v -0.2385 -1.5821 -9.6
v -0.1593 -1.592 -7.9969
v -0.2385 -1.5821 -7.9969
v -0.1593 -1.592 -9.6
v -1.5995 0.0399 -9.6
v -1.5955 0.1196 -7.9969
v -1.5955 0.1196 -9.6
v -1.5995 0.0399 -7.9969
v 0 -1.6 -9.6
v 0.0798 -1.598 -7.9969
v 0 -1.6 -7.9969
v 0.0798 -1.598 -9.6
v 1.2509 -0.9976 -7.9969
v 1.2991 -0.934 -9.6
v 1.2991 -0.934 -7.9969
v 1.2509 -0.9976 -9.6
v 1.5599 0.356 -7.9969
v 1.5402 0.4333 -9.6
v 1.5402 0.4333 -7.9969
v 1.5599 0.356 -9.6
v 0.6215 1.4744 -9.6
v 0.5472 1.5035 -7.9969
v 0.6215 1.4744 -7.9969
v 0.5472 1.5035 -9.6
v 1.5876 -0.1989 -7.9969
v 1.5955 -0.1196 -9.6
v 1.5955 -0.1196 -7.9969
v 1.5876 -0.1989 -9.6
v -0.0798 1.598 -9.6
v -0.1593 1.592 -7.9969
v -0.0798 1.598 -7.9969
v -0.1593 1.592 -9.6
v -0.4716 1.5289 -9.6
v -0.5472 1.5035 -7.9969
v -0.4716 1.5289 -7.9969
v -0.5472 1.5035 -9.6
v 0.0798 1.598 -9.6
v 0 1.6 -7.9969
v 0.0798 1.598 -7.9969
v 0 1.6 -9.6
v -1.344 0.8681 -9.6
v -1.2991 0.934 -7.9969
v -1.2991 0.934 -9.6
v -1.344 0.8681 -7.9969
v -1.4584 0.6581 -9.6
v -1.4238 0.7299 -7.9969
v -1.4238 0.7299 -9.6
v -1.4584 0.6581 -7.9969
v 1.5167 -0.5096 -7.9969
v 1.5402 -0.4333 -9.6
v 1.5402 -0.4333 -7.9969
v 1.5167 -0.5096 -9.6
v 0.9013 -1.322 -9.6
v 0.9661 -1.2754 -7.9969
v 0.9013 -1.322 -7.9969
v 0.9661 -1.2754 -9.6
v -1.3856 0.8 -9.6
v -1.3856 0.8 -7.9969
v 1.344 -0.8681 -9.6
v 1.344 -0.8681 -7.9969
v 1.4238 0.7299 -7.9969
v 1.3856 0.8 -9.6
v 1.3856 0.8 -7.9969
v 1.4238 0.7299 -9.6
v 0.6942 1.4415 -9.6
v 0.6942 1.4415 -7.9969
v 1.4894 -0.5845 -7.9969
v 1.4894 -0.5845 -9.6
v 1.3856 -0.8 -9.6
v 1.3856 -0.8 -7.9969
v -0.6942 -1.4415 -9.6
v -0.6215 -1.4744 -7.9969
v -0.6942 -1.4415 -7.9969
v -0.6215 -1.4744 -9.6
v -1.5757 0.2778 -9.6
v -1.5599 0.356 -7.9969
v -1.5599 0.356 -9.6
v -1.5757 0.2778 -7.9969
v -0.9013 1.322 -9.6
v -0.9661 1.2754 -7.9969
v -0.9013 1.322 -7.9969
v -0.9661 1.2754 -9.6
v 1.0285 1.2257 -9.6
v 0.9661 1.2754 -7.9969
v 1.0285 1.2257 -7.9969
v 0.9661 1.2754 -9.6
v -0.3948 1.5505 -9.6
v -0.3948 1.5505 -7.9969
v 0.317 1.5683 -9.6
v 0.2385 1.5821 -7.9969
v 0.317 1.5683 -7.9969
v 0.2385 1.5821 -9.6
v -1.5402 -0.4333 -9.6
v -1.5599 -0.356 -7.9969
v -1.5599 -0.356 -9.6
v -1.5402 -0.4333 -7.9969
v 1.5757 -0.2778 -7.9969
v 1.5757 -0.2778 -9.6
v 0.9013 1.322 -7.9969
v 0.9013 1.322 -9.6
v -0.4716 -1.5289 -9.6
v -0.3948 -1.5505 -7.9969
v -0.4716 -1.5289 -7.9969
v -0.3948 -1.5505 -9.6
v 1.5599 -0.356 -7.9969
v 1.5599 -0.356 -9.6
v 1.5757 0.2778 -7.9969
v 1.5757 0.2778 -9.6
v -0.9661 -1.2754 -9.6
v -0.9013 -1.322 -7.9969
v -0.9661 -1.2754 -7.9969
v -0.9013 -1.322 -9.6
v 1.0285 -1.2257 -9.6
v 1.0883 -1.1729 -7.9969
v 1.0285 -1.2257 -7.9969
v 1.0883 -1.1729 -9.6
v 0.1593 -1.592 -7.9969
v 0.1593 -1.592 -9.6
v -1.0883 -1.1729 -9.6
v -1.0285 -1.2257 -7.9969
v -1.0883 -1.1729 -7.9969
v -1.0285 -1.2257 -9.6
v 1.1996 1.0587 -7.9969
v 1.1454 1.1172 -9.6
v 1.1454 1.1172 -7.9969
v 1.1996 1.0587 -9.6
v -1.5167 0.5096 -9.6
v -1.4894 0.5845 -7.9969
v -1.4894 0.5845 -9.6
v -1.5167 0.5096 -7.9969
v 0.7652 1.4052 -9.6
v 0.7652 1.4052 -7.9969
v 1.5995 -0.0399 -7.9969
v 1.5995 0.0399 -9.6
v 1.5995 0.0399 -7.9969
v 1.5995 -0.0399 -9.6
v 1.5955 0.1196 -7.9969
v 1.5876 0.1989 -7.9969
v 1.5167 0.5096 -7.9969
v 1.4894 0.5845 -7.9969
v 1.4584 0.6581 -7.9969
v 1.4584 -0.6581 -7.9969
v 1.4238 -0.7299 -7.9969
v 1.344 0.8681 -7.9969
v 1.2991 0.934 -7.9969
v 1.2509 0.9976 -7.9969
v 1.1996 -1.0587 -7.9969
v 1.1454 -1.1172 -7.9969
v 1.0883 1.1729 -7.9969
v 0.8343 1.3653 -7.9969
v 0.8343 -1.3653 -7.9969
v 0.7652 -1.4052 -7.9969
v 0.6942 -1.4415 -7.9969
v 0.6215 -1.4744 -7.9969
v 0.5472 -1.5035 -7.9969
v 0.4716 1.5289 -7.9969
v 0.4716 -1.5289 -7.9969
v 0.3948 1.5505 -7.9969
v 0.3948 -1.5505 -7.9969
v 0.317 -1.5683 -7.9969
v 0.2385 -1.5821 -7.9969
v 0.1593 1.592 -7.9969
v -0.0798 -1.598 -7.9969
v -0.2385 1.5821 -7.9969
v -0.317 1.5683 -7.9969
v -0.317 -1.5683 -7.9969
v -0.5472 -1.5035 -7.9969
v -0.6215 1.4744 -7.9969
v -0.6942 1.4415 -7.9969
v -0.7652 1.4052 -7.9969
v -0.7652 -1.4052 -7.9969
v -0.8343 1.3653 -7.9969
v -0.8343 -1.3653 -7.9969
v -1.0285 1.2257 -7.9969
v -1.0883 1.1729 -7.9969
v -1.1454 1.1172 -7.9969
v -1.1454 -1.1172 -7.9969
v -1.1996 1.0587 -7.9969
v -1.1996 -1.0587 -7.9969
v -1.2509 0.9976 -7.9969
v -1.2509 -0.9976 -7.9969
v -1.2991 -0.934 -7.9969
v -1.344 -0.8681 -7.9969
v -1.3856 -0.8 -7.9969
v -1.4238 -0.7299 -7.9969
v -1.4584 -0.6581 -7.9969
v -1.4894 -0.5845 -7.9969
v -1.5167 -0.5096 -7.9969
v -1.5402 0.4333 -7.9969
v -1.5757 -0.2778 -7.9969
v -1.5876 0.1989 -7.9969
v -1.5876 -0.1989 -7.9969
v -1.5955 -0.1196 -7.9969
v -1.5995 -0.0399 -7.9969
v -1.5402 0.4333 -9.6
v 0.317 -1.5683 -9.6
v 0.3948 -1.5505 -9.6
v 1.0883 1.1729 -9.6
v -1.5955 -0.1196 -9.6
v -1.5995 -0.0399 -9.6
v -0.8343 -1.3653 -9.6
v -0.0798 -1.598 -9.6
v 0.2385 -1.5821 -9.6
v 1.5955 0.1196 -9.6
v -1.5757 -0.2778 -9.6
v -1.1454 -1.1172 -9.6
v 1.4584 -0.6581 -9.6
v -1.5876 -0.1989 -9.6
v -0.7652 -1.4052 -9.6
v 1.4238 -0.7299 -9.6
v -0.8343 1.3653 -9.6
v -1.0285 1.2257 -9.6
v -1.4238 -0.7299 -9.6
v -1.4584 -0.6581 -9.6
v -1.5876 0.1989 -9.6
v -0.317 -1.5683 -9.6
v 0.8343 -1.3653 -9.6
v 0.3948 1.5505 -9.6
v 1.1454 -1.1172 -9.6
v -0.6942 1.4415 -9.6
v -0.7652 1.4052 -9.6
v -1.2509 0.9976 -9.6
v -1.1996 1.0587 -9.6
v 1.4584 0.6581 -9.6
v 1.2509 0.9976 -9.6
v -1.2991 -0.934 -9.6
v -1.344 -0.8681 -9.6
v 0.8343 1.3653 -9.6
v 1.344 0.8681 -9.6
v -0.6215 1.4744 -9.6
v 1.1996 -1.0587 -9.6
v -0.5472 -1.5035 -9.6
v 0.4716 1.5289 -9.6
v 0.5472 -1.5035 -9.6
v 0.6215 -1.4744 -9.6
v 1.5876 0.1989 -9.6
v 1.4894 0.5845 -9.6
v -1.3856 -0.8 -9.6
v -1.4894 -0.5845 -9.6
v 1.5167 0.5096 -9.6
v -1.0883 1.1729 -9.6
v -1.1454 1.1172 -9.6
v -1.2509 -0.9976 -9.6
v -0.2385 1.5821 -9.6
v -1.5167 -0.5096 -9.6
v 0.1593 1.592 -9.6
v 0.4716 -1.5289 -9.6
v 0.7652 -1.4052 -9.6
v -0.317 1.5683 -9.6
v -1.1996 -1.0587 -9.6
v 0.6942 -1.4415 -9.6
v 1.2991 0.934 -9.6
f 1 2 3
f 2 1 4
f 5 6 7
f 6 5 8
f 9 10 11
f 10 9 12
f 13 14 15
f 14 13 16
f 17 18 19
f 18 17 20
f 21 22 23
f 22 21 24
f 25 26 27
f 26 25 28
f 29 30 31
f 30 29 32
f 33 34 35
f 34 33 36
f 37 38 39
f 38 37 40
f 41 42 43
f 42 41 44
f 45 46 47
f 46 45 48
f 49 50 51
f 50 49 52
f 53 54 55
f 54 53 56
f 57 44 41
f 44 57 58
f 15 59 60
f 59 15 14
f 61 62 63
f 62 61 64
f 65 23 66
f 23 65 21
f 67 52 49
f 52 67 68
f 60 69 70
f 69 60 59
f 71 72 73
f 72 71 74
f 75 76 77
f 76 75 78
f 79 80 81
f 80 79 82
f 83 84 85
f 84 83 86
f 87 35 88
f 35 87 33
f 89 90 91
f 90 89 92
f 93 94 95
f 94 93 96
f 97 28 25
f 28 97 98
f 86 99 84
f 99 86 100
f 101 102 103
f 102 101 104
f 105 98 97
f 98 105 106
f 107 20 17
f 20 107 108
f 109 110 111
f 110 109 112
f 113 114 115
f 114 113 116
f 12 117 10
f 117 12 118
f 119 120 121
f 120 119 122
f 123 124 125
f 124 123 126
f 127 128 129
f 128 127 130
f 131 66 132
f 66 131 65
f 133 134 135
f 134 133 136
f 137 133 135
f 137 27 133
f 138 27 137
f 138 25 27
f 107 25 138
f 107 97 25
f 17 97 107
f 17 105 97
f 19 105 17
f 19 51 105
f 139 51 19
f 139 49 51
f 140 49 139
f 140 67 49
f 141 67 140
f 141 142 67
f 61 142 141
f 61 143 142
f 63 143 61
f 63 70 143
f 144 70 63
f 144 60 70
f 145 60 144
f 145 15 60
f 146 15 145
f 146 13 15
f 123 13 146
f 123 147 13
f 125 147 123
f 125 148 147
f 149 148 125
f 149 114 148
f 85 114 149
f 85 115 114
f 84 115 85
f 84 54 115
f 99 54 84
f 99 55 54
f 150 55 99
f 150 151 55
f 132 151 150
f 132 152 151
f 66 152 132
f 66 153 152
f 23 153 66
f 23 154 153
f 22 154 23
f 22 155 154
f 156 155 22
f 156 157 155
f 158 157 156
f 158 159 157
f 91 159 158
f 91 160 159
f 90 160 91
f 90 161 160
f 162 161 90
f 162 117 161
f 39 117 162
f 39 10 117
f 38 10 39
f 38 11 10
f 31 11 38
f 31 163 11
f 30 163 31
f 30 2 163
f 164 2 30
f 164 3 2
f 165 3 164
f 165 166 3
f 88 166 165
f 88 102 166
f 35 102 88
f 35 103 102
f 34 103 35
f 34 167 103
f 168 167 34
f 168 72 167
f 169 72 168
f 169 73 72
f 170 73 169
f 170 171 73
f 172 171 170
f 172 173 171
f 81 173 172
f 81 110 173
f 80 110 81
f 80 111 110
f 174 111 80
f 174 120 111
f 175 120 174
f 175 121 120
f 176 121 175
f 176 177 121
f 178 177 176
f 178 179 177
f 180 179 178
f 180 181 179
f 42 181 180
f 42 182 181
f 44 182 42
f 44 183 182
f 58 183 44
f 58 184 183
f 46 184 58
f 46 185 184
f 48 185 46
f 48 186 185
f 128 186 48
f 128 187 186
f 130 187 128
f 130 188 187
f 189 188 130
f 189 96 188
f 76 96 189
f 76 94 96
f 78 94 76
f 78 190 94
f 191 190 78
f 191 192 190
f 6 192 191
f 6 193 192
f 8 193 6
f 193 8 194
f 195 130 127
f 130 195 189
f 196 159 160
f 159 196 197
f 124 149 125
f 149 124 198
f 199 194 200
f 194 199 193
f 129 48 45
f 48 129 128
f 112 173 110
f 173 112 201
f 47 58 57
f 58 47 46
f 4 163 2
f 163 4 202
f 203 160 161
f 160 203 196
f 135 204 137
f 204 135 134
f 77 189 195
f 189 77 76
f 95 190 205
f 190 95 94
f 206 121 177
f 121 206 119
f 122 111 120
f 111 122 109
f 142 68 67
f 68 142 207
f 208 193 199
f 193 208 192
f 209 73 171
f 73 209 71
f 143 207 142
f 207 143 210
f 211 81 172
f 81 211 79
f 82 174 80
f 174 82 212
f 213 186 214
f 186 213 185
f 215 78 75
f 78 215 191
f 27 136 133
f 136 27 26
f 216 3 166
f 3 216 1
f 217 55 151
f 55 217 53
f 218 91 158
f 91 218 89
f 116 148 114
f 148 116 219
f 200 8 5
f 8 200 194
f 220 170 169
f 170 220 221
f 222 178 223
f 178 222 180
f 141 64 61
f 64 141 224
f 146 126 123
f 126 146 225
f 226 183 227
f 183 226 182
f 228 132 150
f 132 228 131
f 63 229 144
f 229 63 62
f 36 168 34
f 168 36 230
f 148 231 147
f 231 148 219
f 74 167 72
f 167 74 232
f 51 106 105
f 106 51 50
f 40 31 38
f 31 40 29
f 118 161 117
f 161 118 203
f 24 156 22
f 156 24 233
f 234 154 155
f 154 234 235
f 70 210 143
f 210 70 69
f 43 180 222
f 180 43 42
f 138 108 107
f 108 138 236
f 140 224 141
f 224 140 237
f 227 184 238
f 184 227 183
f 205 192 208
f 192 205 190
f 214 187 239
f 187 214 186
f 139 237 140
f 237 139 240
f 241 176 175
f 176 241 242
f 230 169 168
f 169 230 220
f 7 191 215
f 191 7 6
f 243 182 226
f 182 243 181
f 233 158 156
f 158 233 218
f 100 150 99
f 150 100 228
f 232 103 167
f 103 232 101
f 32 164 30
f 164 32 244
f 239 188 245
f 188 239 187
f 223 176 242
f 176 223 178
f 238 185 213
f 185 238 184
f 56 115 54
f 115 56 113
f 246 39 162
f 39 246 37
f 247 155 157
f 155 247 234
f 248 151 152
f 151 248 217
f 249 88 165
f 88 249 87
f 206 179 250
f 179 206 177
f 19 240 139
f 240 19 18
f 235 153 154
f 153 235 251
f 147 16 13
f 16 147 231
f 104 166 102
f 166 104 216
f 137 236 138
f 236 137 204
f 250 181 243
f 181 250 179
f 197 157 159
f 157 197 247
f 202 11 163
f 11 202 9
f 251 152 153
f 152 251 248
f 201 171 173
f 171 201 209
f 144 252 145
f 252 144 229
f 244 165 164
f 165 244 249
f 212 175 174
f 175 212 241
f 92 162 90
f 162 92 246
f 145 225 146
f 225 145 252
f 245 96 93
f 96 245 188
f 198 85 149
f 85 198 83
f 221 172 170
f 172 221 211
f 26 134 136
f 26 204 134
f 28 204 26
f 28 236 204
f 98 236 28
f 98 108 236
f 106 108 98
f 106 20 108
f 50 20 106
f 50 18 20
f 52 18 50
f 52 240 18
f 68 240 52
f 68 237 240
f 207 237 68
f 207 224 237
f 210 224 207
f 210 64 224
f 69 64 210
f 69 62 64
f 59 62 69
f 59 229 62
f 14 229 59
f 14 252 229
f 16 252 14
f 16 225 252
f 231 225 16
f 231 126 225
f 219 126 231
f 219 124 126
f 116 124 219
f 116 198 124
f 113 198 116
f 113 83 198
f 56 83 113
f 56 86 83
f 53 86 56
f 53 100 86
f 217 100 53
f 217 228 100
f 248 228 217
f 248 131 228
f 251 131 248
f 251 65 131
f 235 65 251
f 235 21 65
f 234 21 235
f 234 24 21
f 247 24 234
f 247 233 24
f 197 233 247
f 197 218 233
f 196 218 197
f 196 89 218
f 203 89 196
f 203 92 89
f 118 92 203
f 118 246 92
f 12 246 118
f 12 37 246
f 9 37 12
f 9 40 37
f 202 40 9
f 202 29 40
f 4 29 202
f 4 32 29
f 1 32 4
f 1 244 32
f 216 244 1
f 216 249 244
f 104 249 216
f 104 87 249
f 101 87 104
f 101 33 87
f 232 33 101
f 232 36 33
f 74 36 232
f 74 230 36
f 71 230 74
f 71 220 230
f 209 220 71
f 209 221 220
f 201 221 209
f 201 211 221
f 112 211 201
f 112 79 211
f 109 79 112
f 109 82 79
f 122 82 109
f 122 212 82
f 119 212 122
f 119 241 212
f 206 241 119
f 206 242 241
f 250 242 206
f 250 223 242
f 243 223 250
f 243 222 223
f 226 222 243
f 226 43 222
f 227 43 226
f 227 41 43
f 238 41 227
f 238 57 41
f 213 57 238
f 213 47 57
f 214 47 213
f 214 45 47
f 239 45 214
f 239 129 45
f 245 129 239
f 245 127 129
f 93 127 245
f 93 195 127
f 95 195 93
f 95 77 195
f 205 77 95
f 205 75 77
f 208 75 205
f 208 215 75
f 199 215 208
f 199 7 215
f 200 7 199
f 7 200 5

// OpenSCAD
// file: ../p/4-4edge.scad
use <../lib.scad>
$fa=1; $fs=0.2;
function ldraw_lib__4_4edge(realsolid=false) = [
// 0 Circle 1.0
// 0 Name: 4-4edge.dat
// 0 Author: James Jessiman
// 0 !LDRAW_ORG Primitive UPDATE 2017-01
// 0 !LICENSE Licensed under CC BY 2.0 and CC BY 4.0 : see CAreadme.txt
// 
// 0 BFC CERTIFY CCW
  [0,"BFC","CERTIFY"],
  [0,"BFC","CCW"],
// 
// 0 !HISTORY 1998-12-15 [PTadmin] Official Update 1998-10
// 0 !HISTORY 2005-12-28 [PTadmin] Official Update 2005-01
// 0 !HISTORY 2007-06-24 [PTadmin] Header formatted for Contributor Agreement
// 0 !HISTORY 2008-07-01 [PTadmin] Official Update 2008-01
// 0 !HISTORY 2017-01-15 [Steffen] BFCed
// 0 !HISTORY 2017-12-30 [PTadmin] Official Update 2017-01
// 
// 
// 2 24 1 0 0 0.9239 0 0.3827
  [2,24,1,0,0,0.9239,0,0.3827],
// 2 24 0.9239 0 0.3827 0.7071 0 0.7071
  [2,24,0.9239,0,0.3827,0.7071,0,0.7071],
// 2 24 0.7071 0 0.7071 0.3827 0 0.9239
  [2,24,0.7071,0,0.7071,0.3827,0,0.9239],
// 2 24 0.3827 0 0.9239 0 0 1
  [2,24,0.3827,0,0.9239,0,0,1],
// 2 24 0 0 1 -0.3827 0 0.9239
  [2,24,0,0,1,-0.3827,0,0.9239],
// 2 24 -0.3827 0 0.9239 -0.7071 0 0.7071
  [2,24,-0.3827,0,0.9239,-0.7071,0,0.7071],
// 2 24 -0.7071 0 0.7071 -0.9239 0 0.3827
  [2,24,-0.7071,0,0.7071,-0.9239,0,0.3827],
// 2 24 -0.9239 0 0.3827 -1 0 -0
  [2,24,-0.9239,0,0.3827,-1,0,-0],
// 2 24 -1 0 -0 -0.9239 0 -0.3827
  [2,24,-1,0,-0,-0.9239,0,-0.3827],
// 2 24 -0.9239 0 -0.3827 -0.7071 0 -0.7071
  [2,24,-0.9239,0,-0.3827,-0.7071,0,-0.7071],
// 2 24 -0.7071 0 -0.7071 -0.3827 0 -0.9239
  [2,24,-0.7071,0,-0.7071,-0.3827,0,-0.9239],
// 2 24 -0.3827 0 -0.9239 0 0 -1
  [2,24,-0.3827,0,-0.9239,0,0,-1],
// 2 24 0 0 -1 0.3827 0 -0.9239
  [2,24,0,0,-1,0.3827,0,-0.9239],
// 2 24 0.3827 0 -0.9239 0.7071 0 -0.7071
  [2,24,0.3827,0,-0.9239,0.7071,0,-0.7071],
// 2 24 0.7071 0 -0.7071 0.9239 0 -0.3827
  [2,24,0.7071,0,-0.7071,0.9239,0,-0.3827],
// 2 24 0.9239 0 -0.3827 1 0 0
  [2,24,0.9239,0,-0.3827,1,0,0],
];
module ldraw_lib__4_4edge(step=0, col=false, unit=2/5, alt=false, line=0.2, solid=!$preview)
    makepoly(ldraw_lib__4_4edge(solid), step=step, col=col, unit=unit, alt=alt, line=line, solid=solid);
ldraw_lib__4_4edge(line=0.2);
// file: ../p/4-4disc.scad
use <../lib.scad>
$fa=1; $fs=0.2;
function ldraw_lib__4_4disc(realsolid=false) = [
// 0 Disc 1.0
// 0 Name: 4-4disc.dat
// 0 Author: James Jessiman
// 0 !LDRAW_ORG Primitive UPDATE 2002-02
// 0 !LICENSE Licensed under CC BY 2.0 and CC BY 4.0 : see CAreadme.txt
// 
// 0 BFC CERTIFY CCW
  [0,"BFC","CERTIFY"],
  [0,"BFC","CCW"],
// 
// 0 !HISTORY 1998-12-15 [PTadmin] Official Update 1998-10
// 0 !HISTORY 2002-03-23 [sbliss] Added BFC statement
// 0 !HISTORY 2002-04-25 [PTadmin] Official Update 2002-02
// 0 !HISTORY 2007-06-24 [PTadmin] Header formatted for Contributor Agreement
// 0 !HISTORY 2008-07-01 [PTadmin] Official Update 2008-01
// 
// 
// 3 16 0 0 0 1 0 0 0.9239 0 0.3827
  [3,16,0,0,0,1,0,0,0.9239,0,0.3827],
// 3 16 0 0 0 0.9239 0 0.3827 0.7071 0 0.7071
  [3,16,0,0,0,0.9239,0,0.3827,0.7071,0,0.7071],
// 3 16 0 0 0 0.7071 0 0.7071 0.3827 0 0.9239
  [3,16,0,0,0,0.7071,0,0.7071,0.3827,0,0.9239],
// 3 16 0 0 0 0.3827 0 0.9239 0 0 1
  [3,16,0,0,0,0.3827,0,0.9239,0,0,1],
// 3 16 0 0 0 0 0 1 -0.3827 0 0.9239
  [3,16,0,0,0,0,0,1,-0.3827,0,0.9239],
// 3 16 0 0 0 -0.3827 0 0.9239 -0.7071 0 0.7071
  [3,16,0,0,0,-0.3827,0,0.9239,-0.7071,0,0.7071],
// 3 16 0 0 0 -0.7071 0 0.7071 -0.9239 0 0.3827
  [3,16,0,0,0,-0.7071,0,0.7071,-0.9239,0,0.3827],
// 3 16 0 0 0 -0.9239 0 0.3827 -1 0 -0
  [3,16,0,0,0,-0.9239,0,0.3827,-1,0,-0],
// 3 16 0 0 0 -1 0 -0 -0.9239 0 -0.3827
  [3,16,0,0,0,-1,0,-0,-0.9239,0,-0.3827],
// 3 16 0 0 0 -0.9239 0 -0.3827 -0.7071 0 -0.7071
  [3,16,0,0,0,-0.9239,0,-0.3827,-0.7071,0,-0.7071],
// 3 16 0 0 0 -0.7071 0 -0.7071 -0.3827 0 -0.9239
  [3,16,0,0,0,-0.7071,0,-0.7071,-0.3827,0,-0.9239],
// 3 16 0 0 0 -0.3827 0 -0.9239 0 0 -1
  [3,16,0,0,0,-0.3827,0,-0.9239,0,0,-1],
// 3 16 0 0 0 0 0 -1 0.3827 0 -0.9239
  [3,16,0,0,0,0,0,-1,0.3827,0,-0.9239],
// 3 16 0 0 0 0.3827 0 -0.9239 0.7071 0 -0.7071
  [3,16,0,0,0,0.3827,0,-0.9239,0.7071,0,-0.7071],
// 3 16 0 0 0 0.7071 0 -0.7071 0.9239 0 -0.3827
  [3,16,0,0,0,0.7071,0,-0.7071,0.9239,0,-0.3827],
// 3 16 0 0 0 0.9239 0 -0.3827 1 0 0
  [3,16,0,0,0,0.9239,0,-0.3827,1,0,0],
// 0
];
module ldraw_lib__4_4disc(step=0, col=false, unit=2/5, alt=false, line=0.2, solid=!$preview)
    makepoly(ldraw_lib__4_4disc(solid), step=step, col=col, unit=unit, alt=alt, line=line, solid=solid);
ldraw_lib__4_4disc(line=0.2);
// file: ../p/4-4cyli.scad
use <../lib.scad>
$fa=1; $fs=0.2;
function ldraw_lib__4_4cyli(realsolid=false) = [
// 0 Cylinder 1.0
// 0 Name: 4-4cyli.dat
// 0 Author: James Jessiman
// 0 !LDRAW_ORG Primitive UPDATE 2005-01
// 0 !LICENSE Licensed under CC BY 2.0 and CC BY 4.0 : see CAreadme.txt
// 
// 0 BFC CERTIFY CCW
  [0,"BFC","CERTIFY"],
  [0,"BFC","CCW"],
// 
// 0 !HISTORY 1998-12-15 [PTadmin] Official Update 1998-10
// 0 !HISTORY 2002-03-23 [sbliss] Added BFC statement; merged headers from files in distributions LDraw 0.27 and Complete.
// 0 !HISTORY 2002-04-25 [PTadmin] Official Update 2002-02
// 0 !HISTORY 2004-12-14 [guyvivan] BFC CCW
// 0 !HISTORY 2005-12-28 [PTadmin] Official Update 2005-01
// 0 !HISTORY 2007-06-24 [PTadmin] Header formatted for Contributor Agreement
// 0 !HISTORY 2008-07-01 [PTadmin] Official Update 2008-01
// 
// 
// 4 16 1 1 0 0.9239 1 0.3827 0.9239 0 0.3827 1 0 0
  [4,16,1,1,0,0.9239,1,0.3827,0.9239,0,0.3827,1,0,0],
// 5 24 1 0 0 1 1 0 0.9239 0 0.3827 0.9239 0 -0.3827
  [5,24,1,0,0,1,1,0,0.9239,0,0.3827,0.9239,0,-0.3827],
// 4 16 0.9239 1 0.3827 0.7071 1 0.7071 0.7071 0 0.7071 0.9239 0 0.3827
  [4,16,0.9239,1,0.3827,0.7071,1,0.7071,0.7071,0,0.7071,0.9239,0,0.3827],
// 5 24 0.9239 0 0.3827 0.9239 1 0.3827 0.7071 0 0.7071 1 0 0
  [5,24,0.9239,0,0.3827,0.9239,1,0.3827,0.7071,0,0.7071,1,0,0],
// 4 16 0.7071 1 0.7071 0.3827 1 0.9239 0.3827 0 0.9239 0.7071 0 0.7071
  [4,16,0.7071,1,0.7071,0.3827,1,0.9239,0.3827,0,0.9239,0.7071,0,0.7071],
// 5 24 0.7071 0 0.7071 0.7071 1 0.7071 0.3827 0 0.9239 0.9239 0 0.3827
  [5,24,0.7071,0,0.7071,0.7071,1,0.7071,0.3827,0,0.9239,0.9239,0,0.3827],
// 4 16 0.3827 1 0.9239 0 1 1 0 0 1 0.3827 0 0.9239
  [4,16,0.3827,1,0.9239,0,1,1,0,0,1,0.3827,0,0.9239],
// 5 24 0.3827 0 0.9239 0.3827 1 0.9239 0 0 1 0.7071 0 0.7071
  [5,24,0.3827,0,0.9239,0.3827,1,0.9239,0,0,1,0.7071,0,0.7071],
// 4 16 0 1 1 -0.3827 1 0.9239 -0.3827 0 0.9239 0 0 1
  [4,16,0,1,1,-0.3827,1,0.9239,-0.3827,0,0.9239,0,0,1],
// 5 24 0 0 1 0 1 1 -0.3827 0 0.9239 0.3827 0 0.9239
  [5,24,0,0,1,0,1,1,-0.3827,0,0.9239,0.3827,0,0.9239],
// 4 16 -0.3827 1 0.9239 -0.7071 1 0.7071 -0.7071 0 0.7071 -0.3827 0 0.9239
  [4,16,-0.3827,1,0.9239,-0.7071,1,0.7071,-0.7071,0,0.7071,-0.3827,0,0.9239],
// 5 24 -0.3827 0 0.9239 -0.3827 1 0.9239 -0.7071 0 0.7071 0 0 1
  [5,24,-0.3827,0,0.9239,-0.3827,1,0.9239,-0.7071,0,0.7071,0,0,1],
// 4 16 -0.7071 1 0.7071 -0.9239 1 0.3827 -0.9239 0 0.3827 -0.7071 0 0.7071
  [4,16,-0.7071,1,0.7071,-0.9239,1,0.3827,-0.9239,0,0.3827,-0.7071,0,0.7071],
// 5 24 -0.7071 0 0.7071 -0.7071 1 0.7071 -0.9239 0 0.3827 -0.3827 0 0.9239
  [5,24,-0.7071,0,0.7071,-0.7071,1,0.7071,-0.9239,0,0.3827,-0.3827,0,0.9239],
// 4 16 -0.9239 1 0.3827 -1 1 0 -1 0 0 -0.9239 0 0.3827
  [4,16,-0.9239,1,0.3827,-1,1,0,-1,0,0,-0.9239,0,0.3827],
// 5 24 -0.9239 0 0.3827 -0.9239 1 0.3827 -1 0 0 -0.7071 0 0.7071
  [5,24,-0.9239,0,0.3827,-0.9239,1,0.3827,-1,0,0,-0.7071,0,0.7071],
// 4 16 -1 1 0 -0.9239 1 -0.3827 -0.9239 0 -0.3827 -1 0 0
  [4,16,-1,1,0,-0.9239,1,-0.3827,-0.9239,0,-0.3827,-1,0,0],
// 5 24 -1 0 0 -1 1 0 -0.9239 0 -0.3827 -0.9239 0 0.3827
  [5,24,-1,0,0,-1,1,0,-0.9239,0,-0.3827,-0.9239,0,0.3827],
// 4 16 -0.9239 1 -0.3827 -0.7071 1 -0.7071 -0.7071 0 -0.7071 -0.9239 0 -0.3827
  [4,16,-0.9239,1,-0.3827,-0.7071,1,-0.7071,-0.7071,0,-0.7071,-0.9239,0,-0.3827],
// 5 24 -0.9239 0 -0.3827 -0.9239 1 -0.3827 -0.7071 0 -0.7071 -1 0 0
  [5,24,-0.9239,0,-0.3827,-0.9239,1,-0.3827,-0.7071,0,-0.7071,-1,0,0],
// 4 16 -0.7071 1 -0.7071 -0.3827 1 -0.9239 -0.3827 0 -0.9239 -0.7071 0 -0.7071
  [4,16,-0.7071,1,-0.7071,-0.3827,1,-0.9239,-0.3827,0,-0.9239,-0.7071,0,-0.7071],
// 5 24 -0.7071 0 -0.7071 -0.7071 1 -0.7071 -0.3827 0 -0.9239 -0.9239 0 -0.3827
  [5,24,-0.7071,0,-0.7071,-0.7071,1,-0.7071,-0.3827,0,-0.9239,-0.9239,0,-0.3827],
// 4 16 -0.3827 1 -0.9239 0 1 -1 0 0 -1 -0.3827 0 -0.9239
  [4,16,-0.3827,1,-0.9239,0,1,-1,0,0,-1,-0.3827,0,-0.9239],
// 5 24 -0.3827 0 -0.9239 -0.3827 1 -0.9239 0 0 -1 -0.7071 0 -0.7071
  [5,24,-0.3827,0,-0.9239,-0.3827,1,-0.9239,0,0,-1,-0.7071,0,-0.7071],
// 4 16 0 1 -1 0.3827 1 -0.9239 0.3827 0 -0.9239 0 0 -1
  [4,16,0,1,-1,0.3827,1,-0.9239,0.3827,0,-0.9239,0,0,-1],
// 5 24 0 0 -1 0 1 -1 0.3827 0 -0.9239 -0.3827 0 -0.9239
  [5,24,0,0,-1,0,1,-1,0.3827,0,-0.9239,-0.3827,0,-0.9239],
// 4 16 0.3827 1 -0.9239 0.7071 1 -0.7071 0.7071 0 -0.7071 0.3827 0 -0.9239
  [4,16,0.3827,1,-0.9239,0.7071,1,-0.7071,0.7071,0,-0.7071,0.3827,0,-0.9239],
// 5 24 0.3827 0 -0.9239 0.3827 1 -0.9239 0.7071 0 -0.7071 0 0 -1
  [5,24,0.3827,0,-0.9239,0.3827,1,-0.9239,0.7071,0,-0.7071,0,0,-1],
// 4 16 0.7071 1 -0.7071 0.9239 1 -0.3827 0.9239 0 -0.3827 0.7071 0 -0.7071
  [4,16,0.7071,1,-0.7071,0.9239,1,-0.3827,0.9239,0,-0.3827,0.7071,0,-0.7071],
// 5 24 0.7071 0 -0.7071 0.7071 1 -0.7071 0.9239 0 -0.3827 0.3827 0 -0.9239
  [5,24,0.7071,0,-0.7071,0.7071,1,-0.7071,0.9239,0,-0.3827,0.3827,0,-0.9239],
// 4 16 0.9239 1 -0.3827 1 1 0 1 0 0 0.9239 0 -0.3827
  [4,16,0.9239,1,-0.3827,1,1,0,1,0,0,0.9239,0,-0.3827],
// 5 24 0.9239 0 -0.3827 0.9239 1 -0.3827 1 0 0 0.7071 0 -0.7071
  [5,24,0.9239,0,-0.3827,0.9239,1,-0.3827,1,0,0,0.7071,0,-0.7071],
// 0
];
module ldraw_lib__4_4cyli(step=0, col=false, unit=2/5, alt=false, line=0.2, solid=!$preview)
    makepoly(ldraw_lib__4_4cyli(solid), step=step, col=col, unit=unit, alt=alt, line=line, solid=solid);
ldraw_lib__4_4cyli(line=0.2);
// file: ../p/stud3.scad
use <../lib.scad>
use <4-4cyli.scad>
use <4-4disc.scad>
use <4-4edge.scad>
$fa=1; $fs=0.2;
function ldraw_lib__stud3(realsolid=false) = realsolid ? 
    [openscad(translate([0,0,-eps()], o=cylinder(4+eps(), r=4)),2)] : [
// 0 Stud Tube Solid
// 0 Name: stud3.dat
// 0 Author: James Jessiman
// 0 !LDRAW_ORG Primitive UPDATE 2012-01
// 0 !LICENSE Licensed under CC BY 2.0 and CC BY 4.0 : see CAreadme.txt
// 
// 0 BFC CERTIFY CCW
  [0,"BFC","CERTIFY"],
  [0,"BFC","CCW"],
// 
// 0 !HISTORY 2002-04-04 [sbliss] Modified for BFC compliance
// 0 !HISTORY 2002-04-25 [PTadmin] Official Update 2002-02
// 0 !HISTORY 2007-06-24 [PTadmin] Header formatted for Contributor Agreement
// 0 !HISTORY 2008-07-01 [PTadmin] Official Update 2008-01
// 0 !HISTORY 2012-02-16 [Philo] Changed to CCW
// 0 !HISTORY 2012-03-30 [PTadmin] Official Update 2012-01
// 
// 
// 1 16 0 -4 0 4 0 0 0 1 0 0 0 4 4-4edge.dat
  [1,16,0,-4,0,4,0,0,0,1,0,0,0,4, ldraw_lib__4_4edge(realsolid)],
// 1 16 0 0 0 4 0 0 0 1 0 0 0 4 4-4edge.dat
  [1,16,0,0,0,4,0,0,0,1,0,0,0,4, ldraw_lib__4_4edge(realsolid)],
// 1 16 0 -4 0 4 0 0 0 1 0 0 0 4 4-4disc.dat
  [1,16,0,-4,0,4,0,0,0,1,0,0,0,4, ldraw_lib__4_4disc(realsolid)],
// 1 16 0 -4 0 4 0 0 0 4 0 0 0 4 4-4cyli.dat
  [1,16,0,-4,0,4,0,0,0,4,0,0,0,4, ldraw_lib__4_4cyli(realsolid)],
];
module ldraw_lib__stud3(step=0, col=false, unit=2/5, alt=false, line=0.2, solid=!$preview)
    makepoly(ldraw_lib__stud3(solid), step=step, col=col, unit=unit, alt=alt, line=line, solid=solid);
ldraw_lib__stud3(line=0.2);
// file: ../p/stud.scad
use <../lib.scad>
use <4-4cyli.scad>
use <4-4disc.scad>
use <4-4edge.scad>
$fa=1; $fs=0.2;
function ldraw_lib__stud(realsolid=false) = realsolid ? 
    [openscad(translate([0,0,-eps()], o=cylinder(4+eps(), r=6)),2)] : [
// 0 Stud
// 0 Name: stud.dat
// 0 Author: James Jessiman
// 0 !LDRAW_ORG Primitive UPDATE 2012-01
// 0 !LICENSE Licensed under CC BY 2.0 and CC BY 4.0 : see CAreadme.txt
// 
// 0 BFC CERTIFY CCW
  [0,"BFC","CERTIFY"],
  [0,"BFC","CCW"],
// 
// 0 !HISTORY 2002-04-04 [sbliss] Modified for BFC compliance
// 0 !HISTORY 2002-04-25 [PTadmin] Official Update 2002-02
// 0 !HISTORY 2007-06-24 [PTadmin] Header formatted for Contributor Agreement
// 0 !HISTORY 2008-07-01 [PTadmin] Official Update 2008-01
// 0 !HISTORY 2012-02-16 [Philo] Changed to CCW
// 0 !HISTORY 2012-03-30 [PTadmin] Official Update 2012-01
// 
// 
// 1 16 0 0 0 6 0 0 0 1 0 0 0 6 4-4edge.dat
  [1,16,0,0,0,6,0,0,0,1,0,0,0,6, ldraw_lib__4_4edge(realsolid)],
// 1 16 0 -4 0 6 0 0 0 1 0 0 0 6 4-4edge.dat
  [1,16,0,-4,0,6,0,0,0,1,0,0,0,6, ldraw_lib__4_4edge(realsolid)],
// 1 16 0 0 0 6 0 0 0 -4 0 0 0 6 4-4cyli.dat
  [1,16,0,0,0,6,0,0,0,-4,0,0,0,6, ldraw_lib__4_4cyli(realsolid)],
// 1 16 0 -4 0 6 0 0 0 1 0 0 0 6 4-4disc.dat
  [1,16,0,-4,0,6,0,0,0,1,0,0,0,6, ldraw_lib__4_4disc(realsolid)],
];
module ldraw_lib__stud(step=0, col=false, unit=2/5, alt=false, line=0.2, solid=!$preview)
    makepoly(ldraw_lib__stud(solid), step=step, col=col, unit=unit, alt=alt, line=line, solid=solid);
ldraw_lib__stud(line=0.2);
// file: ../p/box5.scad
use <../lib.scad>
$fa=1; $fs=0.2;
function ldraw_lib__box5(realsolid=false) = [
// 0 Box with 5 Faces and All Edges
// 0 Name: box5.dat
// 0 Author: James Jessiman
// 0 !LDRAW_ORG Primitive UPDATE 2012-01
// 0 !LICENSE Licensed under CC BY 2.0 and CC BY 4.0 : see CAreadme.txt
// 
// 0 BFC CERTIFY CCW
  [0,"BFC","CERTIFY"],
  [0,"BFC","CCW"],
// 
// 0 !HISTORY 2002-04-03 [sbliss] Modified for BFC compliance
// 0 !HISTORY 2002-04-25 [PTadmin] Official Update 2002-02
// 0 !HISTORY 2007-06-24 [PTadmin] Header formatted for Contributor Agreement
// 0 !HISTORY 2008-07-01 [PTadmin] Official Update 2008-01
// 0 !HISTORY 2012-02-16 [Philo] Changed to CCW
// 0 !HISTORY 2012-03-30 [PTadmin] Official Update 2012-01
// 
// 
// 2 24 1 1 1 -1 1 1
  [2,24,1,1,1,-1,1,1],
// 2 24 -1 1 1 -1 1 -1
  [2,24,-1,1,1,-1,1,-1],
// 2 24 -1 1 -1 1 1 -1
  [2,24,-1,1,-1,1,1,-1],
// 2 24 1 1 -1 1 1 1
  [2,24,1,1,-1,1,1,1],
// 2 24 1 0 1 -1 0 1
  [2,24,1,0,1,-1,0,1],
// 2 24 -1 0 1 -1 0 -1
  [2,24,-1,0,1,-1,0,-1],
// 2 24 -1 0 -1 1 0 -1
  [2,24,-1,0,-1,1,0,-1],
// 2 24 1 0 -1 1 0 1
  [2,24,1,0,-1,1,0,1],
// 2 24 1 0 1 1 1 1
  [2,24,1,0,1,1,1,1],
// 2 24 -1 0 1 -1 1 1
  [2,24,-1,0,1,-1,1,1],
// 2 24 1 0 -1 1 1 -1
  [2,24,1,0,-1,1,1,-1],
// 2 24 -1 0 -1 -1 1 -1
  [2,24,-1,0,-1,-1,1,-1],
// 4 16 -1 1 1 1 1 1 1 1 -1 -1 1 -1
  [4,16,-1,1,1,1,1,1,1,1,-1,-1,1,-1],
// 4 16 -1 1 1 -1 0 1 1 0 1 1 1 1
  [4,16,-1,1,1,-1,0,1,1,0,1,1,1,1],
// 4 16 -1 1 -1 -1 0 -1 -1 0 1 -1 1 1
  [4,16,-1,1,-1,-1,0,-1,-1,0,1,-1,1,1],
// 4 16 1 1 -1 1 0 -1 -1 0 -1 -1 1 -1
  [4,16,1,1,-1,1,0,-1,-1,0,-1,-1,1,-1],
// 4 16 1 1 1 1 0 1 1 0 -1 1 1 -1
  [4,16,1,1,1,1,0,1,1,0,-1,1,1,-1],
];
module ldraw_lib__box5(step=0, col=false, unit=2/5, alt=false, line=0.2, solid=!$preview)
    makepoly(ldraw_lib__box5(solid), step=step, col=col, unit=unit, alt=alt, line=line, solid=solid);
ldraw_lib__box5(line=0.2);
// file: ../p/box4t.scad
use <../lib.scad>
$fa=1; $fs=0.2;
function ldraw_lib__box4t(realsolid=false) = [
// 0 Box with 4 Adjacent Faces and All Edges
// 0 Name: box4t.dat
// 0 Author: Tore Eriksson [Tore_Eriksson]
// 0 !LDRAW_ORG Primitive UPDATE 2003-02
// 0 !LICENSE Licensed under CC BY 2.0 and CC BY 4.0 : see CAreadme.txt
// 
// 0 BFC CERTIFY CCW
  [0,"BFC","CERTIFY"],
  [0,"BFC","CCW"],
// 
// 0 !HISTORY 1997-09-29 [PTadmin] Official Update 1997-15
// 0 !HISTORY 2002-08-31 [izanette] Modified with WINDZ for BFC compliance
// 0 !HISTORY 2003-08-01 [PTadmin] Official Update 2003-02
// 0 !HISTORY 2007-06-24 [PTadmin] Header formatted for Contributor Agreement
// 0 !HISTORY 2008-07-01 [PTadmin] Official Update 2008-01
// 
// 
// 2 24 1 1 1 -1 1 1
  [2,24,1,1,1,-1,1,1],
// 2 24 -1 1 1 -1 1 -1
  [2,24,-1,1,1,-1,1,-1],
// 2 24 -1 1 -1 1 1 -1
  [2,24,-1,1,-1,1,1,-1],
// 2 24 1 1 -1 1 1 1
  [2,24,1,1,-1,1,1,1],
// 2 24 1 0 1 -1 0 1
  [2,24,1,0,1,-1,0,1],
// 2 24 -1 0 1 -1 0 -1
  [2,24,-1,0,1,-1,0,-1],
// 2 24 -1 0 -1 1 0 -1
  [2,24,-1,0,-1,1,0,-1],
// 2 24 1 0 -1 1 0 1
  [2,24,1,0,-1,1,0,1],
// 2 24 1 0 1 1 1 1
  [2,24,1,0,1,1,1,1],
// 2 24 -1 0 1 -1 1 1
  [2,24,-1,0,1,-1,1,1],
// 2 24 1 0 -1 1 1 -1
  [2,24,1,0,-1,1,1,-1],
// 2 24 -1 0 -1 -1 1 -1
  [2,24,-1,0,-1,-1,1,-1],
// 4 16 1 1 1 1 1 -1 -1 1 -1 -1 1 1
  [4,16,1,1,1,1,1,-1,-1,1,-1,-1,1,1],
// 4 16 1 1 1 -1 1 1 -1 0 1 1 0 1
  [4,16,1,1,1,-1,1,1,-1,0,1,1,0,1],
// 4 16 -1 1 1 -1 1 -1 -1 0 -1 -1 0 1
  [4,16,-1,1,1,-1,1,-1,-1,0,-1,-1,0,1],
// 0 4 16 -1 1 -1 -1 0 -1 1 0 -1 1 1 -1
// 4 16 1 1 -1 1 1 1 1 0 1 1 0 -1
  [4,16,1,1,-1,1,1,1,1,0,1,1,0,-1],
// 0
];
module ldraw_lib__box4t(step=0, col=false, unit=2/5, alt=false, line=0.2, solid=!$preview)
    makepoly(ldraw_lib__box4t(solid), step=step, col=col, unit=unit, alt=alt, line=line, solid=solid);
ldraw_lib__box4t(line=0.2);
// file: s/4865as01.scad
use <../../lib.scad>
use <../../p/box5.scad>
use <../../p/stud3.scad>
$fa=1; $fs=0.2;
function ldraw_lib__s__4865as01(realsolid=false) = [
// 0 ~Panel  1 x  2 x  1 without Front Face
// 0 Name: s\4865as01.dat
// 0 Author: James Jessiman
// 0 !LDRAW_ORG Subpart UPDATE 2020-03
// 0 !LICENSE Licensed under CC BY 2.0 and CC BY 4.0 : see CAreadme.txt
// 
// 0 BFC CERTIFY CCW
  [0,"BFC","CERTIFY"],
  [0,"BFC","CCW"],
// 
// 0 !HISTORY 2003-07-03 [Steffen] BFCed, subfiled
// 0 !HISTORY 2004-04-22 [PTadmin] Official Update 2004-02
// 0 !HISTORY 2007-09-10 [PTadmin] Header formatted for Contributor Agreement
// 0 !HISTORY 2008-07-01 [PTadmin] Official Update 2008-01
// 0 !HISTORY 2020-07-14 [PTadmin] Renamed from s/4865s01
// 0 !HISTORY 2020-12-29 [PTadmin] Official Update 2020-03
// 
// 
// 1 16 0 20 0 1 0 0 0 -1 0 0 0 1 stud3.dat
  [1,16,0,20,0,1,0,0,0,-1,0,0,0,1, ldraw_lib__stud3(realsolid)],
// 0 BFC INVERTNEXT
  [0,"BFC","INVERTNEXT"],
// 1 16 0 24 0 16 0 0 0 -4 0 0 0 6 box5.dat
  [1,16,0,24,0,16,0,0,0,-4,0,0,0,6, ldraw_lib__box5(realsolid)],
// 4 16 20 24 10 16 24 6 -16 24 6 -20 24 10
  [4,16,20,24,10,16,24,6,-16,24,6,-20,24,10],
// 4 16 -20 24 10 -16 24 6 -16 24 -6 -20 24 -10
  [4,16,-20,24,10,-16,24,6,-16,24,-6,-20,24,-10],
// 4 16 -20 24 -10 -16 24 -6 16 24 -6 20 24 -10
  [4,16,-20,24,-10,-16,24,-6,16,24,-6,20,24,-10],
// 4 16 20 24 -10 16 24 -6 16 24 6 20 24 10
  [4,16,20,24,-10,16,24,-6,16,24,6,20,24,10],
// 2 24 20 24 10 -20 24 10
  [2,24,20,24,10,-20,24,10],
// 2 24 -20 24 10 -20 24 -10
  [2,24,-20,24,10,-20,24,-10],
// 2 24 -20 24 -10 20 24 -10
  [2,24,-20,24,-10,20,24,-10],
// 2 24 20 24 -10 20 24 10
  [2,24,20,24,-10,20,24,10],
// 2 24 20 16 6 -20 16 6
  [2,24,20,16,6,-20,16,6],
// 2 24 -20 16 6 -20 16 -10
  [2,24,-20,16,6,-20,16,-10],
// 2 24 -20 16 -10 20 16 -10
  [2,24,-20,16,-10,20,16,-10],
// 2 24 20 16 -10 20 16 6
  [2,24,20,16,-10,20,16,6],
// 2 24 20 0 10 -20 0 10
  [2,24,20,0,10,-20,0,10],
// 2 24 -20 0 10 -20 0 6
  [2,24,-20,0,10,-20,0,6],
// 2 24 -20 0 6 20 0 6
  [2,24,-20,0,6,20,0,6],
// 2 24 20 0 6 20 0 10
  [2,24,20,0,6,20,0,10],
// 2 24 20 0 6 20 16 6
  [2,24,20,0,6,20,16,6],
// 2 24 -20 0 6 -20 16 6
  [2,24,-20,0,6,-20,16,6],
// 2 24 20 16 -10 20 24 -10
  [2,24,20,16,-10,20,24,-10],
// 2 24 -20 16 -10 -20 24 -10
  [2,24,-20,16,-10,-20,24,-10],
// 2 24 20 0 10 20 24 10
  [2,24,20,0,10,20,24,10],
// 2 24 -20 0 10 -20 24 10
  [2,24,-20,0,10,-20,24,10],
// 4 16 20 16 -10 20 16 6 -20 16 6 -20 16 -10
  [4,16,20,16,-10,20,16,6,-20,16,6,-20,16,-10],
// 4 16 20 0 6 20 0 10 -20 0 10 -20 0 6
  [4,16,20,0,6,20,0,10,-20,0,10,-20,0,6],
// 4 16 -20 24 10 -20 24 -10 -20 16 -10 -20 16 6
  [4,16,-20,24,10,-20,24,-10,-20,16,-10,-20,16,6],
// 4 16 -20 24 -10 20 24 -10 20 16 -10 -20 16 -10
  [4,16,-20,24,-10,20,24,-10,20,16,-10,-20,16,-10],
// 4 16 20 24 -10 20 24 10 20 16 6 20 16 -10
  [4,16,20,24,-10,20,24,10,20,16,6,20,16,-10],
// 4 16 -20 24 10 -20 16 6 -20 0 6 -20 0 10
  [4,16,-20,24,10,-20,16,6,-20,0,6,-20,0,10],
// 4 16 -20 16 6 20 16 6 20 0 6 -20 0 6
  [4,16,-20,16,6,20,16,6,20,0,6,-20,0,6],
// 4 16 20 16 6 20 24 10 20 0 10 20 0 6
  [4,16,20,16,6,20,24,10,20,0,10,20,0,6],
// 0
];
module ldraw_lib__s__4865as01(step=0, col=false, unit=2/5, alt=false, line=0.2, solid=!$preview)
    makepoly(ldraw_lib__s__4865as01(solid), step=step, col=col, unit=unit, alt=alt, line=line, solid=solid);
ldraw_lib__s__4865as01(line=0.2);
// file: s/3004s01.scad
use <../../lib.scad>
use <../../p/box4t.scad>
use <../../p/box5.scad>
use <../../p/stud.scad>
use <../../p/stud3.scad>
$fa=1; $fs=0.2;
function ldraw_lib__s__3004s01(realsolid=false) = [
// 0 ~Brick  1 x  2 without Front Face
// 0 Name: s\3004s01.dat
// 0 Author: James Jessiman
// 0 !LDRAW_ORG Subpart UPDATE 2003-03
// 0 !LICENSE Licensed under CC BY 2.0 and CC BY 4.0 : see CAreadme.txt
// 
// 0 BFC CERTIFY CCW
  [0,"BFC","CERTIFY"],
  [0,"BFC","CCW"],
// 
// 0 !HISTORY 2003-09-07 [jriley] Subfiling, BFC
// 0 !HISTORY 2003-12-19 [PTadmin] Official Update 2003-03
// 0 !HISTORY 2007-08-29 [PTadmin] Header formatted for Contributor Agreement
// 0 !HISTORY 2008-07-01 [PTadmin] Official Update 2008-01
// 
// 
// 1 16 0 4 0 1 0 0 0 -5 0 0 0 1 stud3.dat
  [1,16,0,4,0,1,0,0,0,-5,0,0,0,1, ldraw_lib__stud3(realsolid)],
// 0 BFC INVERTNEXT
  [0,"BFC","INVERTNEXT"],
// 1 16 0 24 0 16 0 0 0 -20 0 0 0 6 box5.dat
  [1,16,0,24,0,16,0,0,0,-20,0,0,0,6, ldraw_lib__box5(realsolid)],
// 4 16 20 24 10 16 24 6 -16 24 6 -20 24 10
  [4,16,20,24,10,16,24,6,-16,24,6,-20,24,10],
// 4 16 -20 24 10 -16 24 6 -16 24 -6 -20 24 -10
  [4,16,-20,24,10,-16,24,6,-16,24,-6,-20,24,-10],
// 4 16 -20 24 -10 -16 24 -6 16 24 -6 20 24 -10
  [4,16,-20,24,-10,-16,24,-6,16,24,-6,20,24,-10],
// 4 16 20 24 -10 16 24 -6 16 24 6 20 24 10
  [4,16,20,24,-10,16,24,-6,16,24,6,20,24,10],
// 1 16 0 24 0 20 0 0 0 -24 0 0 0 10 box4t.dat
  [1,16,0,24,0,20,0,0,0,-24,0,0,0,10, ldraw_lib__box4t(realsolid)],
// 1 16 10 0 0 1 0 0 0 1 0 0 0 1 stud.dat
  [1,16,10,0,0,1,0,0,0,1,0,0,0,1, ldraw_lib__stud(realsolid)],
// 1 16 -10 0 0 1 0 0 0 1 0 0 0 1 stud.dat
  [1,16,-10,0,0,1,0,0,0,1,0,0,0,1, ldraw_lib__stud(realsolid)],
// 0
];
module ldraw_lib__s__3004s01(step=0, col=false, unit=2/5, alt=false, line=0.2, solid=!$preview)
    makepoly(ldraw_lib__s__3004s01(solid), step=step, col=col, unit=unit, alt=alt, line=line, solid=solid);
ldraw_lib__s__3004s01(line=0.2);
// file: 4865ap06.scad
use <../lib.scad>
use <s/4865as01.scad>
$fa=1; $fs=0.2;
function ldraw_lib__4865ap06(realsolid=false) = [
// 0 Panel  1 x  2 x  1 with Black Grille Pattern
// 0 Name: 4865ap06.dat
// 0 Author: Jonathan Wilson [jonwil]
// 0 !LDRAW_ORG Part UPDATE 2020-03
// 0 !LICENSE Licensed under CC BY 2.0 and CC BY 4.0 : see CAreadme.txt
// 
// 0 BFC CERTIFY CCW
  [0,"BFC","CERTIFY"],
  [0,"BFC","CCW"],
// 
// 0 !KEYWORDS BrickLink 4865p06, set 6893
// 
// 0 !HISTORY 1999-12-31 [PTadmin] Official Update 1999-06
// 0 !HISTORY 2004-04-21 [Steffen] replaced guts with subfile; BFC'ed
// 0 !HISTORY 2004-04-22 [PTadmin] Official Update 2004-02
// 0 !HISTORY 2007-07-09 [PTadmin] Header formatted for Contributor Agreement
// 0 !HISTORY 2008-07-01 [PTadmin] Official Update 2008-01
// 0 !HISTORY 2020-07-14 [PTadmin] Renamed from 4865p06
// 0 !HISTORY 2020-12-29 [PTadmin] Official Update 2020-03
// 
// 
// 1 16 0 0 0 1 0 0 0 1 0 0 0 1 s\4865as01.dat
  [1,16,0,0,0,1,0,0,0,1,0,0,0,1, ldraw_lib__s__4865as01(realsolid)],
// 
// 4 16 -20 0 10 20 0 10 20 2.75 10 -20 2.75 10
  [4,16,-20,0,10,20,0,10,20,2.75,10,-20,2.75,10],
// 4 16 -20 21.25 10 -20 2.75 10 -16.25 2.75 10 -16.25 21.25 10
  [4,16,-20,21.25,10,-20,2.75,10,-16.25,2.75,10,-16.25,21.25,10],
// 4 0 -16.25 21.25 10 -16.25 2.75 10 -13.75 2.75 10 -13.75 21.25 10
  [4,0,-16.25,21.25,10,-16.25,2.75,10,-13.75,2.75,10,-13.75,21.25,10],
// 4 16 -13.75 21.25 10 -13.75 2.75 10 -11.25 2.75 10 -11.25 21.25 10
  [4,16,-13.75,21.25,10,-13.75,2.75,10,-11.25,2.75,10,-11.25,21.25,10],
// 4 0 -11.25 21.25 10 -11.25 2.75 10 -8.75 2.75 10 -8.75 21.25 10
  [4,0,-11.25,21.25,10,-11.25,2.75,10,-8.75,2.75,10,-8.75,21.25,10],
// 4 16 -8.75 21.25 10 -8.75 2.75 10 -6.25 2.75 10 -6.25 21.25 10
  [4,16,-8.75,21.25,10,-8.75,2.75,10,-6.25,2.75,10,-6.25,21.25,10],
// 4 0 -6.25 21.25 10 -6.25 2.75 10 -3.75 2.75 10 -3.75 21.25 10
  [4,0,-6.25,21.25,10,-6.25,2.75,10,-3.75,2.75,10,-3.75,21.25,10],
// 4 16 -3.75 21.25 10 -3.75 2.75 10 -1.25 2.75 10 -1.25 21.25 10
  [4,16,-3.75,21.25,10,-3.75,2.75,10,-1.25,2.75,10,-1.25,21.25,10],
// 4 0 -1.25 21.25 10 -1.25 2.75 10 1.25 2.75 10 1.25 21.25 10
  [4,0,-1.25,21.25,10,-1.25,2.75,10,1.25,2.75,10,1.25,21.25,10],
// 4 16 1.25 21.25 10 1.25 2.75 10 3.75 2.75 10 3.75 21.25 10
  [4,16,1.25,21.25,10,1.25,2.75,10,3.75,2.75,10,3.75,21.25,10],
// 4 0 3.75 21.25 10 3.75 2.75 10 6.25 2.75 10 6.25 21.25 10
  [4,0,3.75,21.25,10,3.75,2.75,10,6.25,2.75,10,6.25,21.25,10],
// 4 16 6.25 21.25 10 6.25 2.75 10 8.75 2.75 10 8.75 21.25 10
  [4,16,6.25,21.25,10,6.25,2.75,10,8.75,2.75,10,8.75,21.25,10],
// 4 0 8.75 21.25 10 8.75 2.75 10 11.25 2.75 10 11.25 21.25 10
  [4,0,8.75,21.25,10,8.75,2.75,10,11.25,2.75,10,11.25,21.25,10],
// 4 16 11.25 21.25 10 11.25 2.75 10 13.75 2.75 10 13.75 21.25 10
  [4,16,11.25,21.25,10,11.25,2.75,10,13.75,2.75,10,13.75,21.25,10],
// 4 0 13.75 21.25 10 13.75 2.75 10 16.25 2.75 10 16.25 21.25 10
  [4,0,13.75,21.25,10,13.75,2.75,10,16.25,2.75,10,16.25,21.25,10],
// 4 16 16.25 21.25 10 16.25 2.75 10 20 2.75 10 20 21.25 10
  [4,16,16.25,21.25,10,16.25,2.75,10,20,2.75,10,20,21.25,10],
// 4 16 -20 21.25 10 20 21.25 10 20 24 10 -20 24 10
  [4,16,-20,21.25,10,20,21.25,10,20,24,10,-20,24,10],
// 0
];
module ldraw_lib__4865ap06(step=0, col=false, unit=2/5, alt=false, line=0.2, solid=!$preview)
    makepoly(ldraw_lib__4865ap06(solid), step=step, col=col, unit=unit, alt=alt, line=line, solid=solid);
ldraw_lib__4865ap06(line=0.2);
// file: 3004.scad
use <../lib.scad>
use <s/3004s01.scad>
$fa=1; $fs=0.2;
function ldraw_lib__3004(realsolid=false) = [
// 0 Brick  1 x  2
// 0 Name: 3004.dat
// 0 Author: James Jessiman
// 0 !LDRAW_ORG Part UPDATE 2022-05
// 0 !LICENSE Licensed under CC BY 2.0 and CC BY 4.0 : see CAreadme.txt
// 
// 0 BFC CERTIFY CCW
  [0,"BFC","CERTIFY"],
  [0,"BFC","CCW"],
// 
// 0 !HISTORY 2001-10-26 [PTadmin] Official Update 2001-01
// 0 !HISTORY 2002-05-07 {unknown} BFC Certification
// 0 !HISTORY 2002-06-11 [PTadmin] Official Update 2002-03
// 0 !HISTORY 2007-05-07 [PTadmin] Header formatted for Contributor Agreement
// 0 !HISTORY 2008-07-01 [PTadmin] Official Update 2008-01
// 0 !HISTORY 2022-08-04 [MagFors] Using subfile
// 0 !HISTORY 2022-09-15 [PTadmin] Official Update 2022-05
// 
// 
// 1 16 0 0 0 1 0 0 0 1 0 0 0 1 s\3004s01.dat
  [1,16,0,0,0,1,0,0,0,1,0,0,0,1, ldraw_lib__s__3004s01(realsolid)],
// 4 16 -20 24 -10 20 24 -10 20 0 -10 -20 0 -10
  [4,16,-20,24,-10,20,24,-10,20,0,-10,-20,0,-10],
];
module ldraw_lib__3004(step=0, col=false, unit=2/5, alt=false, line=0.2, solid=!$preview)
    makepoly(ldraw_lib__3004(solid), step=step, col=col, unit=unit, alt=alt, line=line, solid=solid);
ldraw_lib__3004(line=0.2);
// file: 4865p06.scad
use <../lib.scad>
use <4865ap06.scad>
$fa=1; $fs=0.2;
function ldraw_lib__4865p06(realsolid=false) = [
// 0 ~Moved to 4865ap06
// 0 Name: 4865p06.dat
// 0 Author: [PTadmin]
// 0 !LDRAW_ORG Part UPDATE 2020-03
// 0 !LICENSE Licensed under CC BY 4.0 : see CAreadme.txt
// 
// 0 BFC CERTIFY CCW
  [0,"BFC","CERTIFY"],
  [0,"BFC","CCW"],
// 
// 0 !HISTORY 2020-12-29 [PTadmin] Official Update 2020-03
// 
// 
// 0 // Panel 1 x 2 x 1 with Black Grille Pattern
// 1 16 0 0 0 1 0 0 0 1 0 0 0 1 4865ap06.dat
  [1,16,0,0,0,1,0,0,0,1,0,0,0,1, ldraw_lib__4865ap06(realsolid)],
];
module ldraw_lib__4865p06(step=0, col=false, unit=2/5, alt=false, line=0.2, solid=!$preview)
    makepoly(ldraw_lib__4865p06(solid), step=step, col=col, unit=unit, alt=alt, line=line, solid=solid);
ldraw_lib__4865p06(line=0.2);
// main file
use <../lib.scad>
use <4865p06.scad>
$fa=1; $fs=0.2;
function ldraw_lib__81055(realsolid=false) = [
// 0 ~_Panel  1 x  2 x  1 with Black Grille Pattern White (Obsolete)
// 0 Name: 81055.dat
// 0 Author: [PTadmin]
// 0 !LDRAW_ORG Part Physical_Colour UPDATE 2019-02
// 0 !LICENSE Licensed under CC BY 2.0 and CC BY 4.0 : see CAreadme.txt
// 
// 0 BFC CERTIFY CCW
  [0,"BFC","CERTIFY"],
  [0,"BFC","CCW"],
// 
// 0 !HISTORY 1999-12-31 [PTadmin] Official Update 1999-06
// 0 !HISTORY 2007-10-12 [PTadmin] Header formatted for Contributor Agreement
// 0 !HISTORY 2008-07-01 [PTadmin] Official Update 2008-01
// 0 !HISTORY 2019-05-27 [Steffen] BFCed, obsoleted per decision not to include physical colour parts
// 0 !HISTORY 2019-09-09 [PTadmin] Official Update 2019-02
// 
// 
// 1 15 0 0 0 1 0 0 0 1 0 0 0 1 4865p06.dat
  [1,15,0,0,0,1,0,0,0,1,0,0,0,1, ldraw_lib__4865p06(realsolid)],
];
module ldraw_lib__81055(step=0, col=false, unit=2/5, alt=false, line=0.2, solid=!$preview)
    makepoly(ldraw_lib__81055(solid), step=step, col=col, unit=unit, alt=alt, line=line, solid=solid);
ldraw_lib__81055(line=0.2);
